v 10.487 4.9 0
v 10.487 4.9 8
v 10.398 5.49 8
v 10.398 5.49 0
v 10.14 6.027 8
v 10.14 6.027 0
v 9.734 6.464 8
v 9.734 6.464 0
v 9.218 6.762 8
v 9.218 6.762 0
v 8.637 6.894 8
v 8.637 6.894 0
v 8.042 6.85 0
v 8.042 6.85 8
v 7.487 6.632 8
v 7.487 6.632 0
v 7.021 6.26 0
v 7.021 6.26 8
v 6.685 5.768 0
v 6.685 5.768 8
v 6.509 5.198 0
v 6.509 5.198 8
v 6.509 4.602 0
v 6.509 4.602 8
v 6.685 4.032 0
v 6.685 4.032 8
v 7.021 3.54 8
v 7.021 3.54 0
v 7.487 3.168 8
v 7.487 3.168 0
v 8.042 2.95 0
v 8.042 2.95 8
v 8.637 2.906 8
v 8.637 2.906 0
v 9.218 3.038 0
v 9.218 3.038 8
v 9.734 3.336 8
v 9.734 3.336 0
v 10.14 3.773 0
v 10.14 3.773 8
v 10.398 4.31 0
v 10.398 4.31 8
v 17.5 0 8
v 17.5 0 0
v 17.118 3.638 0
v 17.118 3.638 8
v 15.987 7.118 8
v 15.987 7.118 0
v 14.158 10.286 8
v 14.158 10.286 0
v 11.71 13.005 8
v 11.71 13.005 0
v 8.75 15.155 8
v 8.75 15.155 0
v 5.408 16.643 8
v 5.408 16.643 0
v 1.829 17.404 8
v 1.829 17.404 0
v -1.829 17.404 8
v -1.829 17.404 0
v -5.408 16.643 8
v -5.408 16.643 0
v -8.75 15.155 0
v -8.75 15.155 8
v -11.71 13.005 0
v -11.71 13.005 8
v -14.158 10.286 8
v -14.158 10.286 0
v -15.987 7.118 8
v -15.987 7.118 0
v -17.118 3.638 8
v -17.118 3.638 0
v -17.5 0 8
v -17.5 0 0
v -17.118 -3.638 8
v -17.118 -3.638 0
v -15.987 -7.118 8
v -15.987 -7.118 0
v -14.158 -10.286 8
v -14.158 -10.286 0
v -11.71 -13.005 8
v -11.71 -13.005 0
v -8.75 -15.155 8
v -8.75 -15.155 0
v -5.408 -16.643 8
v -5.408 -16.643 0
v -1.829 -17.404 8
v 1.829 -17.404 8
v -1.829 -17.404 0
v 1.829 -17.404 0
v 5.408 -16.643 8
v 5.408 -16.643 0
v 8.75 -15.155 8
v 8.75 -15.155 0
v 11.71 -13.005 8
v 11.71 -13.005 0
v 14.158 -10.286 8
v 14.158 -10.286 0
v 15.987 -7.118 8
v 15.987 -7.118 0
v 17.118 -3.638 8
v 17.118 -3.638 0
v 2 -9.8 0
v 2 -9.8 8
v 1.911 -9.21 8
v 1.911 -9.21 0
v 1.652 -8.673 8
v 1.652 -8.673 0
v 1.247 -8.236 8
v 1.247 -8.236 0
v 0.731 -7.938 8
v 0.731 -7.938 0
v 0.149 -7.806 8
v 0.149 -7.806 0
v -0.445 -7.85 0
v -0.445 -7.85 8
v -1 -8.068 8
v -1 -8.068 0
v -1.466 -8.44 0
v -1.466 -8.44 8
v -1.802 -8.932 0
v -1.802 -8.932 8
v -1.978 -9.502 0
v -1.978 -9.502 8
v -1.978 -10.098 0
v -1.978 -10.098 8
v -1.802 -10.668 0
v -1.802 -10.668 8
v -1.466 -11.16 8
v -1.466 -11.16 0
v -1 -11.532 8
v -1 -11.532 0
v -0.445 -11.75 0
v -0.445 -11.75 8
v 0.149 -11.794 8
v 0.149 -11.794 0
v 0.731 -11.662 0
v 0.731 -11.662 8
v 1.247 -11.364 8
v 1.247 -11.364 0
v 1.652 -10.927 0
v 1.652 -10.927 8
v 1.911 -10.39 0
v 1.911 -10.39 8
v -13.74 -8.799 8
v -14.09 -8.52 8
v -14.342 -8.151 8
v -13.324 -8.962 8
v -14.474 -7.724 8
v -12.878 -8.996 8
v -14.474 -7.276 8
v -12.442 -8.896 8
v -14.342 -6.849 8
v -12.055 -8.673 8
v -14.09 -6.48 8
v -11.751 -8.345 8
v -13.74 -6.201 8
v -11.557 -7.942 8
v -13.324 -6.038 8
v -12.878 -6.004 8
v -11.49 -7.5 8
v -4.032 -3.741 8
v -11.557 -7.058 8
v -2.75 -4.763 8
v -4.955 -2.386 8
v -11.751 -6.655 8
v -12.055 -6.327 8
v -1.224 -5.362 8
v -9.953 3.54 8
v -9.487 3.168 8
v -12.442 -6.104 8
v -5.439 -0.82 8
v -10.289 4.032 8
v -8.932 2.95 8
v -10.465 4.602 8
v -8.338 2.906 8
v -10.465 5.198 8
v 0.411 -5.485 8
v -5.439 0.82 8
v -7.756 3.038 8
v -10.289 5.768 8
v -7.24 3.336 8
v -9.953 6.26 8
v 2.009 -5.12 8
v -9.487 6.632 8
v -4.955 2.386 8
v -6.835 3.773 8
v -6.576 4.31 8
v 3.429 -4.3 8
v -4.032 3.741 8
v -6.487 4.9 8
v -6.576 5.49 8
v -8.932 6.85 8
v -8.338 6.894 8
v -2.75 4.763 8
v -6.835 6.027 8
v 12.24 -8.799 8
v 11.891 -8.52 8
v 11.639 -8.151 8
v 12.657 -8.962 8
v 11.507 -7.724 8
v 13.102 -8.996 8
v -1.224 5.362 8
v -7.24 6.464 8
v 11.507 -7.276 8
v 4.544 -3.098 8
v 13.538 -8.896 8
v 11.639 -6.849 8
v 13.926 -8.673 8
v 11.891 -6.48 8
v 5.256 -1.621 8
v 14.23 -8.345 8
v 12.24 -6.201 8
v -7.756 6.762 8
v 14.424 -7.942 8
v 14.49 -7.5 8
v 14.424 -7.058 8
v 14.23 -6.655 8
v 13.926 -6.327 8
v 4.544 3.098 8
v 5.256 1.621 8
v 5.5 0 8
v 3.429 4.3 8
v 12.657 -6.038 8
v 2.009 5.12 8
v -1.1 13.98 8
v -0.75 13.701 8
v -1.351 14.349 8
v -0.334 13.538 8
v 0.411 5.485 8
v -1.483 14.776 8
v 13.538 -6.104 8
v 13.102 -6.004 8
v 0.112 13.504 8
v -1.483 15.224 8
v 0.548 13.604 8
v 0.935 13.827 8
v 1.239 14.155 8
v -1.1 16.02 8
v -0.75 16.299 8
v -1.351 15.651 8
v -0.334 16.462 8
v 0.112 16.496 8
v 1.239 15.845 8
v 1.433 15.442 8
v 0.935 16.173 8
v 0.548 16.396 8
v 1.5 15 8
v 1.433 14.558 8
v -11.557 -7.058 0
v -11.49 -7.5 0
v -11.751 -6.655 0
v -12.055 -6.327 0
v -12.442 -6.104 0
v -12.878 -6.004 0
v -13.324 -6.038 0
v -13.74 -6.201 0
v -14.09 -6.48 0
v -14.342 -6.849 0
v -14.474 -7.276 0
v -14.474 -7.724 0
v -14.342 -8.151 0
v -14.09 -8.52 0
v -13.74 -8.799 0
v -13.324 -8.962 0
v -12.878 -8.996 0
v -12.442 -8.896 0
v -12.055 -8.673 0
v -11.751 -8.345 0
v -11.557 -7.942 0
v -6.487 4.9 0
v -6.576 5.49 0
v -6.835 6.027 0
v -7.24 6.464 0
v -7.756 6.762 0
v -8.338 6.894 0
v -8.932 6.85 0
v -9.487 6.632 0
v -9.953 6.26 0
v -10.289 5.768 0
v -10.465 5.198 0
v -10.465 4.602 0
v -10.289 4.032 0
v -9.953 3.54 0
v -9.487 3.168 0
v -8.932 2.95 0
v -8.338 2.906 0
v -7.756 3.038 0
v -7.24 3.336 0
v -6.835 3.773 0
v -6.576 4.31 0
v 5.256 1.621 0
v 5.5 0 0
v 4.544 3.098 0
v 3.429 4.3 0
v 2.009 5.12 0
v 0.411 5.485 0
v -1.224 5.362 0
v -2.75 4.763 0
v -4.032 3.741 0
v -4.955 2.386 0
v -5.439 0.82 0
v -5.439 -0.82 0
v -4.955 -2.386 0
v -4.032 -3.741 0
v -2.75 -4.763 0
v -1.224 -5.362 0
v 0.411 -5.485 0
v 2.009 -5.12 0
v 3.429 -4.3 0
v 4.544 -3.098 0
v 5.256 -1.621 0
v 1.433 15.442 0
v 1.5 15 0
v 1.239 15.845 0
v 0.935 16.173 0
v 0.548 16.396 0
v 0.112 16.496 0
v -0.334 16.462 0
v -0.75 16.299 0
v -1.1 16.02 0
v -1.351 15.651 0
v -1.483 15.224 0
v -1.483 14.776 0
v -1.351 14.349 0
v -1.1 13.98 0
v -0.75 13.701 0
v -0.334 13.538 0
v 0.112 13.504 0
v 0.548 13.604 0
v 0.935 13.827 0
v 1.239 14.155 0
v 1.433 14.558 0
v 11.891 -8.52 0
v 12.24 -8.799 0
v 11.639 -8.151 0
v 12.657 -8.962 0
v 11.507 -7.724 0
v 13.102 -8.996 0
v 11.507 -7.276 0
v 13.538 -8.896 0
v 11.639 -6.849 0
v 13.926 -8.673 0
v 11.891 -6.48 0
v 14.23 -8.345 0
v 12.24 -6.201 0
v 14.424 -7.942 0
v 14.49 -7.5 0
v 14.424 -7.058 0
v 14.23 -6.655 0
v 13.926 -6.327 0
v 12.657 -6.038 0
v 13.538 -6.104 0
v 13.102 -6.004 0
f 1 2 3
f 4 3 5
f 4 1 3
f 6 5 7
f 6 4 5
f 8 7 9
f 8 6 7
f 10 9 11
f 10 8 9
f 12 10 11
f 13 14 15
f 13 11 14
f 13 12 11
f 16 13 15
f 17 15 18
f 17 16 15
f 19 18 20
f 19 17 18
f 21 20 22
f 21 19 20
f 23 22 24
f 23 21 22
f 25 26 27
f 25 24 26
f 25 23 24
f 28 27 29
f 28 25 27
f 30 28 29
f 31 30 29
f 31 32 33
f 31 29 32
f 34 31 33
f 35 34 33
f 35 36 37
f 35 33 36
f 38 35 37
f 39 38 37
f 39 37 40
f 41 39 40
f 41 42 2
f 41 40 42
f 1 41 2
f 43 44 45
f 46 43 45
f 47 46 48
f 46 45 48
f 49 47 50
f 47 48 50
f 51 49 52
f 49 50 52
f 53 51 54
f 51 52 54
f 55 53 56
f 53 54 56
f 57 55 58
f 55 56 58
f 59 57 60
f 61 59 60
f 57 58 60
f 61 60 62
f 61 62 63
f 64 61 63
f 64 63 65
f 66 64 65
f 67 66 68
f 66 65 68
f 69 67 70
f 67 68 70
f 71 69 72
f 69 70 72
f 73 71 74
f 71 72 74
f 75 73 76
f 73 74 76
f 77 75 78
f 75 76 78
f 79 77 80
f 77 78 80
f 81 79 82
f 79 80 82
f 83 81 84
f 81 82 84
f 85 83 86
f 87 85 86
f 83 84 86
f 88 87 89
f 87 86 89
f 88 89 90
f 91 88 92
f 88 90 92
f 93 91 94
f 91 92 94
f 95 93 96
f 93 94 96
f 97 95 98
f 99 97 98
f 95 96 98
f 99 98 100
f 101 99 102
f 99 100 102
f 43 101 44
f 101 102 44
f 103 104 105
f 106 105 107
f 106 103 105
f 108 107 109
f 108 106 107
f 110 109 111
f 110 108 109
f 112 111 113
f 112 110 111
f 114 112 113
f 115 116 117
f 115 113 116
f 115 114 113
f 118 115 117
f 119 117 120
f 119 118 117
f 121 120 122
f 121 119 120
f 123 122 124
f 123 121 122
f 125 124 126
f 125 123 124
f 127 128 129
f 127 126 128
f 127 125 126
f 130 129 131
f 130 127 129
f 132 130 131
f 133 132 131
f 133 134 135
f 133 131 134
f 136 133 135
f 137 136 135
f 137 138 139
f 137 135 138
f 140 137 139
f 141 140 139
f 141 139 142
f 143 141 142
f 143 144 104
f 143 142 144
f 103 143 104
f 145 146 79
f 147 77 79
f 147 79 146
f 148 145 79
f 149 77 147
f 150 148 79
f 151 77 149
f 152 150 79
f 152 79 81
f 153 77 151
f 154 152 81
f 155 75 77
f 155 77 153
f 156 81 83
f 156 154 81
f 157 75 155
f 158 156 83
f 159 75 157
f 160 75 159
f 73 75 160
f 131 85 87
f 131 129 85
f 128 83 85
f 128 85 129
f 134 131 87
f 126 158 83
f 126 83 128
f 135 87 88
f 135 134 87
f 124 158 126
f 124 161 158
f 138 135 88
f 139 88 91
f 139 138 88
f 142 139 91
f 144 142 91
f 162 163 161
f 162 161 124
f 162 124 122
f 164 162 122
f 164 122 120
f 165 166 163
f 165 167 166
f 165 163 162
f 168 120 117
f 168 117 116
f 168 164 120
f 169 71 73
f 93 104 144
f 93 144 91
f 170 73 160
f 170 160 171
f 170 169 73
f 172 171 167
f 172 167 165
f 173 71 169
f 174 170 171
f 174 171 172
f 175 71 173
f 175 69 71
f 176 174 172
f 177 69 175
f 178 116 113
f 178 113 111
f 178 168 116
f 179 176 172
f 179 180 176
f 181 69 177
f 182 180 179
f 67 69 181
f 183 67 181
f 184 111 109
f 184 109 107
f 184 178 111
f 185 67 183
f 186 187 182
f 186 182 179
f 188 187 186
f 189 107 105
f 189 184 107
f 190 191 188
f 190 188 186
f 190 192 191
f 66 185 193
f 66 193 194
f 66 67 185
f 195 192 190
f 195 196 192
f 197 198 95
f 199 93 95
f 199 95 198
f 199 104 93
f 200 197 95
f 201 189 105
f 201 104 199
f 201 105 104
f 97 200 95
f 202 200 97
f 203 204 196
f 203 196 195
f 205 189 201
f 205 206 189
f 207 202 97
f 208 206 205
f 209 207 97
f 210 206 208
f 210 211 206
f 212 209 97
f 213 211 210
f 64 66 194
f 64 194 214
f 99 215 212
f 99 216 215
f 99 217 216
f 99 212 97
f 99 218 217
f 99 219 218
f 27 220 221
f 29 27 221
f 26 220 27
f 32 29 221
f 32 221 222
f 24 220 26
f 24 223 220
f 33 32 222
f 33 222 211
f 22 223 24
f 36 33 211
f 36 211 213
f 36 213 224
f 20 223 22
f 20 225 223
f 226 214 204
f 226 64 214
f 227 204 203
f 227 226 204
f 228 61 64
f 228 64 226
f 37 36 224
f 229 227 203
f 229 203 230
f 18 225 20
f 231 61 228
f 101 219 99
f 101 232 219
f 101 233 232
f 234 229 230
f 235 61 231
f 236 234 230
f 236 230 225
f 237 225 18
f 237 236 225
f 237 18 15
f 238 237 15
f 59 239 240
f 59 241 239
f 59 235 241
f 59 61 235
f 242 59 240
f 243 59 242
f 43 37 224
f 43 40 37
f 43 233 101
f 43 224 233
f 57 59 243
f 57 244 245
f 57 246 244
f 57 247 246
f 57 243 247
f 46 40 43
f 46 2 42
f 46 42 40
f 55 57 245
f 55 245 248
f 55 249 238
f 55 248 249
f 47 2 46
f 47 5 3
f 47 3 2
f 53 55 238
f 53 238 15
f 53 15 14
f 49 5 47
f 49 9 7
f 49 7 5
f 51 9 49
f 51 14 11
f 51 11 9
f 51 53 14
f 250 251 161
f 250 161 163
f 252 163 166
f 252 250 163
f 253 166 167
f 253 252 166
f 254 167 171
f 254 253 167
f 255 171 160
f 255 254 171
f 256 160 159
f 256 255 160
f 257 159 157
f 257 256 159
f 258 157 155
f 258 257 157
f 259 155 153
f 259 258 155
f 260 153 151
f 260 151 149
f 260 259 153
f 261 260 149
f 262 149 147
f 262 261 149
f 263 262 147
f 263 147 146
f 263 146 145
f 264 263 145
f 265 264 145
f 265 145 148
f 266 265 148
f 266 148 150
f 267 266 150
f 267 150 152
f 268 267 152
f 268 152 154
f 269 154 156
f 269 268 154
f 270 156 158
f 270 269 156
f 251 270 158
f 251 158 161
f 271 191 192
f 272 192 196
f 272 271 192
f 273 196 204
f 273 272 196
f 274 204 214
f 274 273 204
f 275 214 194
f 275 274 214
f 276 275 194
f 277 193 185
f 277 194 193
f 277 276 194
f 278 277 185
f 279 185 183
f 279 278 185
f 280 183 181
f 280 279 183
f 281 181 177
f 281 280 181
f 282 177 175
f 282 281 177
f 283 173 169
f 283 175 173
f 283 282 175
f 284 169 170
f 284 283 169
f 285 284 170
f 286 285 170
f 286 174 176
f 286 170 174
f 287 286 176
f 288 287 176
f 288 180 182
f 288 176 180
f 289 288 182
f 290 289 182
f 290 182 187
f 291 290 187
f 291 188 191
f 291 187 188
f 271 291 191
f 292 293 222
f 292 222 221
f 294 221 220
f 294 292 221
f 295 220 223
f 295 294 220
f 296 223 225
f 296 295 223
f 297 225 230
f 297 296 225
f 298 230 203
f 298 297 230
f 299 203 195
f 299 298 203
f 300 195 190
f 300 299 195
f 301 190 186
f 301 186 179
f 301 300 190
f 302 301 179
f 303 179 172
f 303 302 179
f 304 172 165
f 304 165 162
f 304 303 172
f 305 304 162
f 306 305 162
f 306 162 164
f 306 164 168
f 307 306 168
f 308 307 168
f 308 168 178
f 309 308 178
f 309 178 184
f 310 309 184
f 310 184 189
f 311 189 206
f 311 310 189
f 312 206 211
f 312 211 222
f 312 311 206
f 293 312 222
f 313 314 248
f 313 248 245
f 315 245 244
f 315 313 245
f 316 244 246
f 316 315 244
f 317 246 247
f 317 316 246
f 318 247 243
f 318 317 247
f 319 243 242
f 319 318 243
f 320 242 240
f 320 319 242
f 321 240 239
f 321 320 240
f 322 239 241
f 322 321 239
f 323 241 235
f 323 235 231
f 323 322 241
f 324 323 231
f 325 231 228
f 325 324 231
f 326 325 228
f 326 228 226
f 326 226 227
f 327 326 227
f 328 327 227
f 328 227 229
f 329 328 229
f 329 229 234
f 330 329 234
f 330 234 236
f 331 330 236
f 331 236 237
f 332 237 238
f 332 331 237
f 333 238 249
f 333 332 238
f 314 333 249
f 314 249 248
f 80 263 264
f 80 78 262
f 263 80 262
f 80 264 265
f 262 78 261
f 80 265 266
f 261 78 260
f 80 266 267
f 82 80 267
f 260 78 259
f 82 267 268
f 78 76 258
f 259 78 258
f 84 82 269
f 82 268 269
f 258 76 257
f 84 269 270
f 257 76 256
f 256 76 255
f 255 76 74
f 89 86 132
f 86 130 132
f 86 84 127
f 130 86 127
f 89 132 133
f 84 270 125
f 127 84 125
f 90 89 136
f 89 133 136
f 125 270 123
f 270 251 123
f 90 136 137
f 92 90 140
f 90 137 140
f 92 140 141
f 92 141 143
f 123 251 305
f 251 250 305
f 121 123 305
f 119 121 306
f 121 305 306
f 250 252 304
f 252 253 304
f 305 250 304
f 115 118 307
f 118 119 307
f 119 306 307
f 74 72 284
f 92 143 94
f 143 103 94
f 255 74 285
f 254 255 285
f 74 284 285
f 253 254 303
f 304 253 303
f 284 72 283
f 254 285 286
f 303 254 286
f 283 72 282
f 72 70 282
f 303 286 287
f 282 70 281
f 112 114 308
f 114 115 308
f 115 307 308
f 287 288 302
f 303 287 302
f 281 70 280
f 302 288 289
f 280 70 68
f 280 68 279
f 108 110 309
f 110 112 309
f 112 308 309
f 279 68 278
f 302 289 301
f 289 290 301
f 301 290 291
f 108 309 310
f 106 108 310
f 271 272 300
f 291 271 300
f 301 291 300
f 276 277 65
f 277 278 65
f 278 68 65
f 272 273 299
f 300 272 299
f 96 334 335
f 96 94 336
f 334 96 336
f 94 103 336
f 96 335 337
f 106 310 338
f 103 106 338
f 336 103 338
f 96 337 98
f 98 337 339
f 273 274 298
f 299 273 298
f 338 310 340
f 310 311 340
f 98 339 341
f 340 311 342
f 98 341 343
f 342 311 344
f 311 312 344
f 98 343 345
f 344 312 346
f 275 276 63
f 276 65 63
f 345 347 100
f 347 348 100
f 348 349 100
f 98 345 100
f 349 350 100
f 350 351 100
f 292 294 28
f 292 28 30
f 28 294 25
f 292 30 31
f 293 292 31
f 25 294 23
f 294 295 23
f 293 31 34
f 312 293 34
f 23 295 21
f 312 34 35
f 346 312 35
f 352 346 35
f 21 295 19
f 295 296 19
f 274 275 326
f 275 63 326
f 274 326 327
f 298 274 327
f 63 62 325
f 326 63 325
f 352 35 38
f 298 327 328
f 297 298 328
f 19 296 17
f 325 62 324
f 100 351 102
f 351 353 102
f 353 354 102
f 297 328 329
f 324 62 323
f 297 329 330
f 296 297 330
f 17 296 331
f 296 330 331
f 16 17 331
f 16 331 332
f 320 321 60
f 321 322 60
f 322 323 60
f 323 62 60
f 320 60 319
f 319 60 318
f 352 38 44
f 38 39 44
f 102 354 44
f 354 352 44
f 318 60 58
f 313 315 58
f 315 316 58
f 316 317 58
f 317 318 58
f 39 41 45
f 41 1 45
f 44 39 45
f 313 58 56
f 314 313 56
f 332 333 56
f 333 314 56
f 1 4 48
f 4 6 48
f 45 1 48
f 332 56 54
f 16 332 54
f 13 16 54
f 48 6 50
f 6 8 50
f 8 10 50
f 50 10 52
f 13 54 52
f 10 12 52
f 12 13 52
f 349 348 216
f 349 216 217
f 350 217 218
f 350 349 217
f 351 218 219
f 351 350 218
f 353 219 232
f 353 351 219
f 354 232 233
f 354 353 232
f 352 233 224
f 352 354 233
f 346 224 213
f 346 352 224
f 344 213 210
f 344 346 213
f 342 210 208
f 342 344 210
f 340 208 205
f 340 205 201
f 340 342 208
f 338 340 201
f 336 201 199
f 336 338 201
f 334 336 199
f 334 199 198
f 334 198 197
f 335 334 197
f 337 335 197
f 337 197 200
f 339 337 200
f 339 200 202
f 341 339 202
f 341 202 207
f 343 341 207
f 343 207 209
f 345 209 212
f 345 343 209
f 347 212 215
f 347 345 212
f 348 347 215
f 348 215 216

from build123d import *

# Parameters (mm, degrees)
SKETCH_1_R          = 17.5
SKETCH_1_R_2        = 1.5
SKETCH_1_R_3        = 5.5
EXTRUDE_1_DEPTH     = 8
SKETCH_2_R          = 2
CUT_EXTRUDE_1_DEPTH = 19


with BuildPart() as part:
    # 草图1 → 凸台-拉伸1 (new body)
    with BuildSketch(Plane.XY):
        Circle(SKETCH_1_R)
        with Locations((0, 15)):
            Circle(SKETCH_1_R_2, mode=Mode.SUBTRACT)
        with Locations((12.990381057, -7.5)):
            Circle(SKETCH_1_R_2, mode=Mode.SUBTRACT)
        with Locations((-12.990381057, -7.5)):
            Circle(SKETCH_1_R_2, mode=Mode.SUBTRACT)
        Circle(SKETCH_1_R_3, mode=Mode.SUBTRACT)
    extrude(amount=EXTRUDE_1_DEPTH)

    # 草图2 → 切除-拉伸1 (cut)
    with BuildSketch(Plane.XY):
        with Locations((-8.487048957, 4.9)):
            Circle(SKETCH_2_R)
        with Locations((8.487048957, 4.9)):
            Circle(SKETCH_2_R)
        with Locations((0, -9.8)):
            Circle(SKETCH_2_R)
    extrude(amount=CUT_EXTRUDE_1_DEPTH, mode=Mode.SUBTRACT)


solid = part.part
